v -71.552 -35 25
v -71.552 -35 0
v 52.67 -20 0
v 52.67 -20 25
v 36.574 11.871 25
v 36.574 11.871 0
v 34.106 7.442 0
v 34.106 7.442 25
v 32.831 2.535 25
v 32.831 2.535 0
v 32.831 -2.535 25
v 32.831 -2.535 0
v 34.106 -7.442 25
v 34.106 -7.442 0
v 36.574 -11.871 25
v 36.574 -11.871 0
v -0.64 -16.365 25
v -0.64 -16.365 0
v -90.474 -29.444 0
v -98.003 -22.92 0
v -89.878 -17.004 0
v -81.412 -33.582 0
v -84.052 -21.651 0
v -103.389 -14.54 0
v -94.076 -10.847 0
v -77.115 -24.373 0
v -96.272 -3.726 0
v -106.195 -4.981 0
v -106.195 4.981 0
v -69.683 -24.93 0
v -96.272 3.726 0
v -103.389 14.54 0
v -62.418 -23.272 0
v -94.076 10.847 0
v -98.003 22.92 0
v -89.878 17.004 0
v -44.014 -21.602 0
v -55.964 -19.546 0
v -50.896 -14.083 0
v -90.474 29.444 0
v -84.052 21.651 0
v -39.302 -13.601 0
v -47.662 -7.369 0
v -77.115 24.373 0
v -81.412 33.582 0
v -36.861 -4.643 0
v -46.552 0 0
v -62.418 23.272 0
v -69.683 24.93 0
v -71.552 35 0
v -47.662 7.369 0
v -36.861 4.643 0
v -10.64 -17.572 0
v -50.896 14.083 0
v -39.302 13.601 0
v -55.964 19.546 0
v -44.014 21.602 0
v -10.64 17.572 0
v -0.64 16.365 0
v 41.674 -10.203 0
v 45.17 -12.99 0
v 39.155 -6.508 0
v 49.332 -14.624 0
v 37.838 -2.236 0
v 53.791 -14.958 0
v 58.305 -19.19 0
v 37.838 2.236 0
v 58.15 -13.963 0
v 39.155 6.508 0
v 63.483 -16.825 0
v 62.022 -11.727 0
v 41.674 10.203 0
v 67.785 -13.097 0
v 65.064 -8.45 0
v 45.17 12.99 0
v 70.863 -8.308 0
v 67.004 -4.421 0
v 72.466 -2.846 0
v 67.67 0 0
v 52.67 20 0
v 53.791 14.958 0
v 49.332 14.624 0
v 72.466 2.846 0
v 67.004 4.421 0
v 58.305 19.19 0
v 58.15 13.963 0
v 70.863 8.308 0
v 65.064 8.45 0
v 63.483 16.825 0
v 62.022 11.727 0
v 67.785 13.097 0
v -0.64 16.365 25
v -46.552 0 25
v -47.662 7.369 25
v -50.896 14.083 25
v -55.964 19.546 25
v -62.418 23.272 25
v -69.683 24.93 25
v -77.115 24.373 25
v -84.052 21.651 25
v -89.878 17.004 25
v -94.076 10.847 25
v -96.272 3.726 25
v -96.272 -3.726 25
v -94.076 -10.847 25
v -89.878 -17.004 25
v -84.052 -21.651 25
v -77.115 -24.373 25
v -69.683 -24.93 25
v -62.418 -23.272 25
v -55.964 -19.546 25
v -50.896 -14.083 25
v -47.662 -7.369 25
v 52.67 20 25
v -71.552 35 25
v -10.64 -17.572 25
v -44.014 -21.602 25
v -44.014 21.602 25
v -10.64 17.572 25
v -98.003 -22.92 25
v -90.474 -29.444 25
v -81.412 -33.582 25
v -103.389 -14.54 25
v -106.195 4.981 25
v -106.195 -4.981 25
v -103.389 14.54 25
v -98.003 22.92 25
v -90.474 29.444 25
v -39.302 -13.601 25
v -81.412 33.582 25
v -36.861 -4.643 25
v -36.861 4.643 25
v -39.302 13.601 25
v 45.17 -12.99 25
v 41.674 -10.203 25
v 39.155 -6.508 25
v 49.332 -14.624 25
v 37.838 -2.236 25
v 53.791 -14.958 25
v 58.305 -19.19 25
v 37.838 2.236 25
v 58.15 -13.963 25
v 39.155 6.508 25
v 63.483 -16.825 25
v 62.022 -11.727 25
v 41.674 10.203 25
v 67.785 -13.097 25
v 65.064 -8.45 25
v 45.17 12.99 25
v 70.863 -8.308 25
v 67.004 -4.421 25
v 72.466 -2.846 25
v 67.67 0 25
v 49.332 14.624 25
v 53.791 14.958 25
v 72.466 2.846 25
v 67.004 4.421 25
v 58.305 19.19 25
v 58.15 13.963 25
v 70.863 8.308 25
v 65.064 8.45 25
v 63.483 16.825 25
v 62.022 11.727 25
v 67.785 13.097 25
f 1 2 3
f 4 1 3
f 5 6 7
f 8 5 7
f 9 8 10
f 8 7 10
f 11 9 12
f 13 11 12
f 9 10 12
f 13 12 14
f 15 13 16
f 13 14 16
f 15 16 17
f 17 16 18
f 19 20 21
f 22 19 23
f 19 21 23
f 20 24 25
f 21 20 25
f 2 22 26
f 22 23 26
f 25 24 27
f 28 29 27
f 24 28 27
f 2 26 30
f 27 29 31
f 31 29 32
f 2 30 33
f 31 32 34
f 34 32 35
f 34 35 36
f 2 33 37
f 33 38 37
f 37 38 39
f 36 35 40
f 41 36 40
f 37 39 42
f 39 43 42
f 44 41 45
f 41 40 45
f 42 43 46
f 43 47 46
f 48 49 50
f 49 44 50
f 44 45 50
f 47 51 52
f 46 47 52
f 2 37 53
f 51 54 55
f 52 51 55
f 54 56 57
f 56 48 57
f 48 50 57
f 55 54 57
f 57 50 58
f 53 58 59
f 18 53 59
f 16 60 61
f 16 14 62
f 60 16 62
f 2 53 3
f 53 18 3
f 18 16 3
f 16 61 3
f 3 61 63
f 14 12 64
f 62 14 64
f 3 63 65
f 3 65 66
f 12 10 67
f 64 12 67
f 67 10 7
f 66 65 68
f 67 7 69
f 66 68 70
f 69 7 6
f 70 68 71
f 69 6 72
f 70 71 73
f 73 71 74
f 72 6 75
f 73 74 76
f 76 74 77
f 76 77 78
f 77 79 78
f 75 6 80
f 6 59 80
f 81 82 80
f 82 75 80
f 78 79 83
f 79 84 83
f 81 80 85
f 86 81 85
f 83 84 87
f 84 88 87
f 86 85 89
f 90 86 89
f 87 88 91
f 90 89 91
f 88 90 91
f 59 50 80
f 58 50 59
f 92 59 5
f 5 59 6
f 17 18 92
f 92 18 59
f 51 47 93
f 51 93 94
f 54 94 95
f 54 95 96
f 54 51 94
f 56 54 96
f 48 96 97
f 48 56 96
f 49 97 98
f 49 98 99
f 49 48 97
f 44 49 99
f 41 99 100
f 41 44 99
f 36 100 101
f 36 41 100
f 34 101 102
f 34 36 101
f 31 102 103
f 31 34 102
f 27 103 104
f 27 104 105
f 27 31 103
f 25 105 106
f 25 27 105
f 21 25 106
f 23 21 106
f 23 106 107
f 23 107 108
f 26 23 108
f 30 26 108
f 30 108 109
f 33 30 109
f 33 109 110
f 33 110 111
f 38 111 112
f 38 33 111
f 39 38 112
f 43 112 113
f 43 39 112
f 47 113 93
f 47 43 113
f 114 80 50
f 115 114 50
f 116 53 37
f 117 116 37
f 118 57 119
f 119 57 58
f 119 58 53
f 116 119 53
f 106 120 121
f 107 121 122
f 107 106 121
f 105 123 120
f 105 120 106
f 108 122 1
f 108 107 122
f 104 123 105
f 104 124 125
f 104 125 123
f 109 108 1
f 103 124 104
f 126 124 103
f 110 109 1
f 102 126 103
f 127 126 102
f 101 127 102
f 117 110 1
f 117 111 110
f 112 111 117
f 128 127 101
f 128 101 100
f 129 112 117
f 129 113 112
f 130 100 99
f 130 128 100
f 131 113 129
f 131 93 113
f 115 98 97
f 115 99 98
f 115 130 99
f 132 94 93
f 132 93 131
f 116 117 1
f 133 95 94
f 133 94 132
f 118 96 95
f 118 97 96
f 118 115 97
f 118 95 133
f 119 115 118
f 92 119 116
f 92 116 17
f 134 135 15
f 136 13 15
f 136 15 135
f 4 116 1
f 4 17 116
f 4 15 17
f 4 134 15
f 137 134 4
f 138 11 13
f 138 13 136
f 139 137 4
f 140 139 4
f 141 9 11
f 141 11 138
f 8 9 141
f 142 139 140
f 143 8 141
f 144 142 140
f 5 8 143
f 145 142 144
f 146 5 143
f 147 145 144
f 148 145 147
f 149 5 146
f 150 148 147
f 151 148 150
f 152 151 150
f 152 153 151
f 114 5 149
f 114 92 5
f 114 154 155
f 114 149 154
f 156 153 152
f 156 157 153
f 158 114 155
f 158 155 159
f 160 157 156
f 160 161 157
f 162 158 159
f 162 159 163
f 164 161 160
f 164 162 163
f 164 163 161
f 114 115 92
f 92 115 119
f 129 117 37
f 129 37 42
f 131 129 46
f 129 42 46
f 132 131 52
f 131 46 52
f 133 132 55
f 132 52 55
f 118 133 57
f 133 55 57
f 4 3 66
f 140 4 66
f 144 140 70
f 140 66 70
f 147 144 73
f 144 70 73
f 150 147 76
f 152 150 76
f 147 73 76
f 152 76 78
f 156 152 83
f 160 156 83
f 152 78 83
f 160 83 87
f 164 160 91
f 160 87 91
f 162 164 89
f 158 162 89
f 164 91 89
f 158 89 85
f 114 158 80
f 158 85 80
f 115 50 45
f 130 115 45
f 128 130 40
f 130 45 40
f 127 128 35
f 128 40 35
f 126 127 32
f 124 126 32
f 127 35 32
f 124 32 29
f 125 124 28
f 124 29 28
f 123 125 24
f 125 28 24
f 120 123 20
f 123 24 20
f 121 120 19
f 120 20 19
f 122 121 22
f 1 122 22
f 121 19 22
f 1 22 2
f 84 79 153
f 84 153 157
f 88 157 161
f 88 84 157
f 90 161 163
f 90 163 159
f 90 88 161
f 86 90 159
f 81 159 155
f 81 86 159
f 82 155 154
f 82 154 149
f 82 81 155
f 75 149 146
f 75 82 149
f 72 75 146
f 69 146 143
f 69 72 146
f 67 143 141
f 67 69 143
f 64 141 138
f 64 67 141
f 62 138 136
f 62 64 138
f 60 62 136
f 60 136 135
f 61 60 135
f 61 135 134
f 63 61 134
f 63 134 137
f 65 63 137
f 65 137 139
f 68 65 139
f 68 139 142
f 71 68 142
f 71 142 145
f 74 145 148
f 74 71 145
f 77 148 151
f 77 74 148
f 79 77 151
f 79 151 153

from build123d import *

# Parameters (mm, degrees)
F0_R     = 25
F0_R_2   = 15
F1_DEPTH = 25


with BuildPart() as f1:
    # F0 (on Top) → F1 (new body)
    with BuildSketch(Plane.XY):
        with BuildLine():
            Line((52.66999, 20), (-71.551683, 35))
            ThreePointArc((-71.551683, 35), (-106.551683, 0), (-71.551683, -35))
            Line((-71.551683, -35), (52.66999, -20))
            ThreePointArc((52.66999, -20), (72.66999, 0), (52.66999, 20))
        make_face()
        with Locations((-71.551683, 0)):
            Circle(F0_R, mode=Mode.SUBTRACT)
        with BuildLine():
            ThreePointArc((-44.01352, -21.602074), (-36.551683, 0), (-44.01352, 21.602074))
            Line((-44.01352, 21.602074), (-10.639657, 17.572117))
            Line((-10.639657, 17.572117), (-10.639657, -17.572117))
            Line((-10.639657, -17.572117), (-44.01352, -21.602074))
        make_face(mode=Mode.SUBTRACT)
        with BuildLine():
            Line((-0.639657, 16.364599), (36.57403, 11.870976))
            ThreePointArc((36.57403, 11.870976), (32.66999, 0), (36.57403, -11.870976))
            Line((36.57403, -11.870976), (-0.639657, -16.364599))
            Line((-0.639657, -16.364599), (-0.639657, 16.364599))
        make_face(mode=Mode.SUBTRACT)
        with Locations((52.66999, 0)):
            Circle(F0_R_2, mode=Mode.SUBTRACT)
    extrude(amount=F1_DEPTH)


solid = f1.part
